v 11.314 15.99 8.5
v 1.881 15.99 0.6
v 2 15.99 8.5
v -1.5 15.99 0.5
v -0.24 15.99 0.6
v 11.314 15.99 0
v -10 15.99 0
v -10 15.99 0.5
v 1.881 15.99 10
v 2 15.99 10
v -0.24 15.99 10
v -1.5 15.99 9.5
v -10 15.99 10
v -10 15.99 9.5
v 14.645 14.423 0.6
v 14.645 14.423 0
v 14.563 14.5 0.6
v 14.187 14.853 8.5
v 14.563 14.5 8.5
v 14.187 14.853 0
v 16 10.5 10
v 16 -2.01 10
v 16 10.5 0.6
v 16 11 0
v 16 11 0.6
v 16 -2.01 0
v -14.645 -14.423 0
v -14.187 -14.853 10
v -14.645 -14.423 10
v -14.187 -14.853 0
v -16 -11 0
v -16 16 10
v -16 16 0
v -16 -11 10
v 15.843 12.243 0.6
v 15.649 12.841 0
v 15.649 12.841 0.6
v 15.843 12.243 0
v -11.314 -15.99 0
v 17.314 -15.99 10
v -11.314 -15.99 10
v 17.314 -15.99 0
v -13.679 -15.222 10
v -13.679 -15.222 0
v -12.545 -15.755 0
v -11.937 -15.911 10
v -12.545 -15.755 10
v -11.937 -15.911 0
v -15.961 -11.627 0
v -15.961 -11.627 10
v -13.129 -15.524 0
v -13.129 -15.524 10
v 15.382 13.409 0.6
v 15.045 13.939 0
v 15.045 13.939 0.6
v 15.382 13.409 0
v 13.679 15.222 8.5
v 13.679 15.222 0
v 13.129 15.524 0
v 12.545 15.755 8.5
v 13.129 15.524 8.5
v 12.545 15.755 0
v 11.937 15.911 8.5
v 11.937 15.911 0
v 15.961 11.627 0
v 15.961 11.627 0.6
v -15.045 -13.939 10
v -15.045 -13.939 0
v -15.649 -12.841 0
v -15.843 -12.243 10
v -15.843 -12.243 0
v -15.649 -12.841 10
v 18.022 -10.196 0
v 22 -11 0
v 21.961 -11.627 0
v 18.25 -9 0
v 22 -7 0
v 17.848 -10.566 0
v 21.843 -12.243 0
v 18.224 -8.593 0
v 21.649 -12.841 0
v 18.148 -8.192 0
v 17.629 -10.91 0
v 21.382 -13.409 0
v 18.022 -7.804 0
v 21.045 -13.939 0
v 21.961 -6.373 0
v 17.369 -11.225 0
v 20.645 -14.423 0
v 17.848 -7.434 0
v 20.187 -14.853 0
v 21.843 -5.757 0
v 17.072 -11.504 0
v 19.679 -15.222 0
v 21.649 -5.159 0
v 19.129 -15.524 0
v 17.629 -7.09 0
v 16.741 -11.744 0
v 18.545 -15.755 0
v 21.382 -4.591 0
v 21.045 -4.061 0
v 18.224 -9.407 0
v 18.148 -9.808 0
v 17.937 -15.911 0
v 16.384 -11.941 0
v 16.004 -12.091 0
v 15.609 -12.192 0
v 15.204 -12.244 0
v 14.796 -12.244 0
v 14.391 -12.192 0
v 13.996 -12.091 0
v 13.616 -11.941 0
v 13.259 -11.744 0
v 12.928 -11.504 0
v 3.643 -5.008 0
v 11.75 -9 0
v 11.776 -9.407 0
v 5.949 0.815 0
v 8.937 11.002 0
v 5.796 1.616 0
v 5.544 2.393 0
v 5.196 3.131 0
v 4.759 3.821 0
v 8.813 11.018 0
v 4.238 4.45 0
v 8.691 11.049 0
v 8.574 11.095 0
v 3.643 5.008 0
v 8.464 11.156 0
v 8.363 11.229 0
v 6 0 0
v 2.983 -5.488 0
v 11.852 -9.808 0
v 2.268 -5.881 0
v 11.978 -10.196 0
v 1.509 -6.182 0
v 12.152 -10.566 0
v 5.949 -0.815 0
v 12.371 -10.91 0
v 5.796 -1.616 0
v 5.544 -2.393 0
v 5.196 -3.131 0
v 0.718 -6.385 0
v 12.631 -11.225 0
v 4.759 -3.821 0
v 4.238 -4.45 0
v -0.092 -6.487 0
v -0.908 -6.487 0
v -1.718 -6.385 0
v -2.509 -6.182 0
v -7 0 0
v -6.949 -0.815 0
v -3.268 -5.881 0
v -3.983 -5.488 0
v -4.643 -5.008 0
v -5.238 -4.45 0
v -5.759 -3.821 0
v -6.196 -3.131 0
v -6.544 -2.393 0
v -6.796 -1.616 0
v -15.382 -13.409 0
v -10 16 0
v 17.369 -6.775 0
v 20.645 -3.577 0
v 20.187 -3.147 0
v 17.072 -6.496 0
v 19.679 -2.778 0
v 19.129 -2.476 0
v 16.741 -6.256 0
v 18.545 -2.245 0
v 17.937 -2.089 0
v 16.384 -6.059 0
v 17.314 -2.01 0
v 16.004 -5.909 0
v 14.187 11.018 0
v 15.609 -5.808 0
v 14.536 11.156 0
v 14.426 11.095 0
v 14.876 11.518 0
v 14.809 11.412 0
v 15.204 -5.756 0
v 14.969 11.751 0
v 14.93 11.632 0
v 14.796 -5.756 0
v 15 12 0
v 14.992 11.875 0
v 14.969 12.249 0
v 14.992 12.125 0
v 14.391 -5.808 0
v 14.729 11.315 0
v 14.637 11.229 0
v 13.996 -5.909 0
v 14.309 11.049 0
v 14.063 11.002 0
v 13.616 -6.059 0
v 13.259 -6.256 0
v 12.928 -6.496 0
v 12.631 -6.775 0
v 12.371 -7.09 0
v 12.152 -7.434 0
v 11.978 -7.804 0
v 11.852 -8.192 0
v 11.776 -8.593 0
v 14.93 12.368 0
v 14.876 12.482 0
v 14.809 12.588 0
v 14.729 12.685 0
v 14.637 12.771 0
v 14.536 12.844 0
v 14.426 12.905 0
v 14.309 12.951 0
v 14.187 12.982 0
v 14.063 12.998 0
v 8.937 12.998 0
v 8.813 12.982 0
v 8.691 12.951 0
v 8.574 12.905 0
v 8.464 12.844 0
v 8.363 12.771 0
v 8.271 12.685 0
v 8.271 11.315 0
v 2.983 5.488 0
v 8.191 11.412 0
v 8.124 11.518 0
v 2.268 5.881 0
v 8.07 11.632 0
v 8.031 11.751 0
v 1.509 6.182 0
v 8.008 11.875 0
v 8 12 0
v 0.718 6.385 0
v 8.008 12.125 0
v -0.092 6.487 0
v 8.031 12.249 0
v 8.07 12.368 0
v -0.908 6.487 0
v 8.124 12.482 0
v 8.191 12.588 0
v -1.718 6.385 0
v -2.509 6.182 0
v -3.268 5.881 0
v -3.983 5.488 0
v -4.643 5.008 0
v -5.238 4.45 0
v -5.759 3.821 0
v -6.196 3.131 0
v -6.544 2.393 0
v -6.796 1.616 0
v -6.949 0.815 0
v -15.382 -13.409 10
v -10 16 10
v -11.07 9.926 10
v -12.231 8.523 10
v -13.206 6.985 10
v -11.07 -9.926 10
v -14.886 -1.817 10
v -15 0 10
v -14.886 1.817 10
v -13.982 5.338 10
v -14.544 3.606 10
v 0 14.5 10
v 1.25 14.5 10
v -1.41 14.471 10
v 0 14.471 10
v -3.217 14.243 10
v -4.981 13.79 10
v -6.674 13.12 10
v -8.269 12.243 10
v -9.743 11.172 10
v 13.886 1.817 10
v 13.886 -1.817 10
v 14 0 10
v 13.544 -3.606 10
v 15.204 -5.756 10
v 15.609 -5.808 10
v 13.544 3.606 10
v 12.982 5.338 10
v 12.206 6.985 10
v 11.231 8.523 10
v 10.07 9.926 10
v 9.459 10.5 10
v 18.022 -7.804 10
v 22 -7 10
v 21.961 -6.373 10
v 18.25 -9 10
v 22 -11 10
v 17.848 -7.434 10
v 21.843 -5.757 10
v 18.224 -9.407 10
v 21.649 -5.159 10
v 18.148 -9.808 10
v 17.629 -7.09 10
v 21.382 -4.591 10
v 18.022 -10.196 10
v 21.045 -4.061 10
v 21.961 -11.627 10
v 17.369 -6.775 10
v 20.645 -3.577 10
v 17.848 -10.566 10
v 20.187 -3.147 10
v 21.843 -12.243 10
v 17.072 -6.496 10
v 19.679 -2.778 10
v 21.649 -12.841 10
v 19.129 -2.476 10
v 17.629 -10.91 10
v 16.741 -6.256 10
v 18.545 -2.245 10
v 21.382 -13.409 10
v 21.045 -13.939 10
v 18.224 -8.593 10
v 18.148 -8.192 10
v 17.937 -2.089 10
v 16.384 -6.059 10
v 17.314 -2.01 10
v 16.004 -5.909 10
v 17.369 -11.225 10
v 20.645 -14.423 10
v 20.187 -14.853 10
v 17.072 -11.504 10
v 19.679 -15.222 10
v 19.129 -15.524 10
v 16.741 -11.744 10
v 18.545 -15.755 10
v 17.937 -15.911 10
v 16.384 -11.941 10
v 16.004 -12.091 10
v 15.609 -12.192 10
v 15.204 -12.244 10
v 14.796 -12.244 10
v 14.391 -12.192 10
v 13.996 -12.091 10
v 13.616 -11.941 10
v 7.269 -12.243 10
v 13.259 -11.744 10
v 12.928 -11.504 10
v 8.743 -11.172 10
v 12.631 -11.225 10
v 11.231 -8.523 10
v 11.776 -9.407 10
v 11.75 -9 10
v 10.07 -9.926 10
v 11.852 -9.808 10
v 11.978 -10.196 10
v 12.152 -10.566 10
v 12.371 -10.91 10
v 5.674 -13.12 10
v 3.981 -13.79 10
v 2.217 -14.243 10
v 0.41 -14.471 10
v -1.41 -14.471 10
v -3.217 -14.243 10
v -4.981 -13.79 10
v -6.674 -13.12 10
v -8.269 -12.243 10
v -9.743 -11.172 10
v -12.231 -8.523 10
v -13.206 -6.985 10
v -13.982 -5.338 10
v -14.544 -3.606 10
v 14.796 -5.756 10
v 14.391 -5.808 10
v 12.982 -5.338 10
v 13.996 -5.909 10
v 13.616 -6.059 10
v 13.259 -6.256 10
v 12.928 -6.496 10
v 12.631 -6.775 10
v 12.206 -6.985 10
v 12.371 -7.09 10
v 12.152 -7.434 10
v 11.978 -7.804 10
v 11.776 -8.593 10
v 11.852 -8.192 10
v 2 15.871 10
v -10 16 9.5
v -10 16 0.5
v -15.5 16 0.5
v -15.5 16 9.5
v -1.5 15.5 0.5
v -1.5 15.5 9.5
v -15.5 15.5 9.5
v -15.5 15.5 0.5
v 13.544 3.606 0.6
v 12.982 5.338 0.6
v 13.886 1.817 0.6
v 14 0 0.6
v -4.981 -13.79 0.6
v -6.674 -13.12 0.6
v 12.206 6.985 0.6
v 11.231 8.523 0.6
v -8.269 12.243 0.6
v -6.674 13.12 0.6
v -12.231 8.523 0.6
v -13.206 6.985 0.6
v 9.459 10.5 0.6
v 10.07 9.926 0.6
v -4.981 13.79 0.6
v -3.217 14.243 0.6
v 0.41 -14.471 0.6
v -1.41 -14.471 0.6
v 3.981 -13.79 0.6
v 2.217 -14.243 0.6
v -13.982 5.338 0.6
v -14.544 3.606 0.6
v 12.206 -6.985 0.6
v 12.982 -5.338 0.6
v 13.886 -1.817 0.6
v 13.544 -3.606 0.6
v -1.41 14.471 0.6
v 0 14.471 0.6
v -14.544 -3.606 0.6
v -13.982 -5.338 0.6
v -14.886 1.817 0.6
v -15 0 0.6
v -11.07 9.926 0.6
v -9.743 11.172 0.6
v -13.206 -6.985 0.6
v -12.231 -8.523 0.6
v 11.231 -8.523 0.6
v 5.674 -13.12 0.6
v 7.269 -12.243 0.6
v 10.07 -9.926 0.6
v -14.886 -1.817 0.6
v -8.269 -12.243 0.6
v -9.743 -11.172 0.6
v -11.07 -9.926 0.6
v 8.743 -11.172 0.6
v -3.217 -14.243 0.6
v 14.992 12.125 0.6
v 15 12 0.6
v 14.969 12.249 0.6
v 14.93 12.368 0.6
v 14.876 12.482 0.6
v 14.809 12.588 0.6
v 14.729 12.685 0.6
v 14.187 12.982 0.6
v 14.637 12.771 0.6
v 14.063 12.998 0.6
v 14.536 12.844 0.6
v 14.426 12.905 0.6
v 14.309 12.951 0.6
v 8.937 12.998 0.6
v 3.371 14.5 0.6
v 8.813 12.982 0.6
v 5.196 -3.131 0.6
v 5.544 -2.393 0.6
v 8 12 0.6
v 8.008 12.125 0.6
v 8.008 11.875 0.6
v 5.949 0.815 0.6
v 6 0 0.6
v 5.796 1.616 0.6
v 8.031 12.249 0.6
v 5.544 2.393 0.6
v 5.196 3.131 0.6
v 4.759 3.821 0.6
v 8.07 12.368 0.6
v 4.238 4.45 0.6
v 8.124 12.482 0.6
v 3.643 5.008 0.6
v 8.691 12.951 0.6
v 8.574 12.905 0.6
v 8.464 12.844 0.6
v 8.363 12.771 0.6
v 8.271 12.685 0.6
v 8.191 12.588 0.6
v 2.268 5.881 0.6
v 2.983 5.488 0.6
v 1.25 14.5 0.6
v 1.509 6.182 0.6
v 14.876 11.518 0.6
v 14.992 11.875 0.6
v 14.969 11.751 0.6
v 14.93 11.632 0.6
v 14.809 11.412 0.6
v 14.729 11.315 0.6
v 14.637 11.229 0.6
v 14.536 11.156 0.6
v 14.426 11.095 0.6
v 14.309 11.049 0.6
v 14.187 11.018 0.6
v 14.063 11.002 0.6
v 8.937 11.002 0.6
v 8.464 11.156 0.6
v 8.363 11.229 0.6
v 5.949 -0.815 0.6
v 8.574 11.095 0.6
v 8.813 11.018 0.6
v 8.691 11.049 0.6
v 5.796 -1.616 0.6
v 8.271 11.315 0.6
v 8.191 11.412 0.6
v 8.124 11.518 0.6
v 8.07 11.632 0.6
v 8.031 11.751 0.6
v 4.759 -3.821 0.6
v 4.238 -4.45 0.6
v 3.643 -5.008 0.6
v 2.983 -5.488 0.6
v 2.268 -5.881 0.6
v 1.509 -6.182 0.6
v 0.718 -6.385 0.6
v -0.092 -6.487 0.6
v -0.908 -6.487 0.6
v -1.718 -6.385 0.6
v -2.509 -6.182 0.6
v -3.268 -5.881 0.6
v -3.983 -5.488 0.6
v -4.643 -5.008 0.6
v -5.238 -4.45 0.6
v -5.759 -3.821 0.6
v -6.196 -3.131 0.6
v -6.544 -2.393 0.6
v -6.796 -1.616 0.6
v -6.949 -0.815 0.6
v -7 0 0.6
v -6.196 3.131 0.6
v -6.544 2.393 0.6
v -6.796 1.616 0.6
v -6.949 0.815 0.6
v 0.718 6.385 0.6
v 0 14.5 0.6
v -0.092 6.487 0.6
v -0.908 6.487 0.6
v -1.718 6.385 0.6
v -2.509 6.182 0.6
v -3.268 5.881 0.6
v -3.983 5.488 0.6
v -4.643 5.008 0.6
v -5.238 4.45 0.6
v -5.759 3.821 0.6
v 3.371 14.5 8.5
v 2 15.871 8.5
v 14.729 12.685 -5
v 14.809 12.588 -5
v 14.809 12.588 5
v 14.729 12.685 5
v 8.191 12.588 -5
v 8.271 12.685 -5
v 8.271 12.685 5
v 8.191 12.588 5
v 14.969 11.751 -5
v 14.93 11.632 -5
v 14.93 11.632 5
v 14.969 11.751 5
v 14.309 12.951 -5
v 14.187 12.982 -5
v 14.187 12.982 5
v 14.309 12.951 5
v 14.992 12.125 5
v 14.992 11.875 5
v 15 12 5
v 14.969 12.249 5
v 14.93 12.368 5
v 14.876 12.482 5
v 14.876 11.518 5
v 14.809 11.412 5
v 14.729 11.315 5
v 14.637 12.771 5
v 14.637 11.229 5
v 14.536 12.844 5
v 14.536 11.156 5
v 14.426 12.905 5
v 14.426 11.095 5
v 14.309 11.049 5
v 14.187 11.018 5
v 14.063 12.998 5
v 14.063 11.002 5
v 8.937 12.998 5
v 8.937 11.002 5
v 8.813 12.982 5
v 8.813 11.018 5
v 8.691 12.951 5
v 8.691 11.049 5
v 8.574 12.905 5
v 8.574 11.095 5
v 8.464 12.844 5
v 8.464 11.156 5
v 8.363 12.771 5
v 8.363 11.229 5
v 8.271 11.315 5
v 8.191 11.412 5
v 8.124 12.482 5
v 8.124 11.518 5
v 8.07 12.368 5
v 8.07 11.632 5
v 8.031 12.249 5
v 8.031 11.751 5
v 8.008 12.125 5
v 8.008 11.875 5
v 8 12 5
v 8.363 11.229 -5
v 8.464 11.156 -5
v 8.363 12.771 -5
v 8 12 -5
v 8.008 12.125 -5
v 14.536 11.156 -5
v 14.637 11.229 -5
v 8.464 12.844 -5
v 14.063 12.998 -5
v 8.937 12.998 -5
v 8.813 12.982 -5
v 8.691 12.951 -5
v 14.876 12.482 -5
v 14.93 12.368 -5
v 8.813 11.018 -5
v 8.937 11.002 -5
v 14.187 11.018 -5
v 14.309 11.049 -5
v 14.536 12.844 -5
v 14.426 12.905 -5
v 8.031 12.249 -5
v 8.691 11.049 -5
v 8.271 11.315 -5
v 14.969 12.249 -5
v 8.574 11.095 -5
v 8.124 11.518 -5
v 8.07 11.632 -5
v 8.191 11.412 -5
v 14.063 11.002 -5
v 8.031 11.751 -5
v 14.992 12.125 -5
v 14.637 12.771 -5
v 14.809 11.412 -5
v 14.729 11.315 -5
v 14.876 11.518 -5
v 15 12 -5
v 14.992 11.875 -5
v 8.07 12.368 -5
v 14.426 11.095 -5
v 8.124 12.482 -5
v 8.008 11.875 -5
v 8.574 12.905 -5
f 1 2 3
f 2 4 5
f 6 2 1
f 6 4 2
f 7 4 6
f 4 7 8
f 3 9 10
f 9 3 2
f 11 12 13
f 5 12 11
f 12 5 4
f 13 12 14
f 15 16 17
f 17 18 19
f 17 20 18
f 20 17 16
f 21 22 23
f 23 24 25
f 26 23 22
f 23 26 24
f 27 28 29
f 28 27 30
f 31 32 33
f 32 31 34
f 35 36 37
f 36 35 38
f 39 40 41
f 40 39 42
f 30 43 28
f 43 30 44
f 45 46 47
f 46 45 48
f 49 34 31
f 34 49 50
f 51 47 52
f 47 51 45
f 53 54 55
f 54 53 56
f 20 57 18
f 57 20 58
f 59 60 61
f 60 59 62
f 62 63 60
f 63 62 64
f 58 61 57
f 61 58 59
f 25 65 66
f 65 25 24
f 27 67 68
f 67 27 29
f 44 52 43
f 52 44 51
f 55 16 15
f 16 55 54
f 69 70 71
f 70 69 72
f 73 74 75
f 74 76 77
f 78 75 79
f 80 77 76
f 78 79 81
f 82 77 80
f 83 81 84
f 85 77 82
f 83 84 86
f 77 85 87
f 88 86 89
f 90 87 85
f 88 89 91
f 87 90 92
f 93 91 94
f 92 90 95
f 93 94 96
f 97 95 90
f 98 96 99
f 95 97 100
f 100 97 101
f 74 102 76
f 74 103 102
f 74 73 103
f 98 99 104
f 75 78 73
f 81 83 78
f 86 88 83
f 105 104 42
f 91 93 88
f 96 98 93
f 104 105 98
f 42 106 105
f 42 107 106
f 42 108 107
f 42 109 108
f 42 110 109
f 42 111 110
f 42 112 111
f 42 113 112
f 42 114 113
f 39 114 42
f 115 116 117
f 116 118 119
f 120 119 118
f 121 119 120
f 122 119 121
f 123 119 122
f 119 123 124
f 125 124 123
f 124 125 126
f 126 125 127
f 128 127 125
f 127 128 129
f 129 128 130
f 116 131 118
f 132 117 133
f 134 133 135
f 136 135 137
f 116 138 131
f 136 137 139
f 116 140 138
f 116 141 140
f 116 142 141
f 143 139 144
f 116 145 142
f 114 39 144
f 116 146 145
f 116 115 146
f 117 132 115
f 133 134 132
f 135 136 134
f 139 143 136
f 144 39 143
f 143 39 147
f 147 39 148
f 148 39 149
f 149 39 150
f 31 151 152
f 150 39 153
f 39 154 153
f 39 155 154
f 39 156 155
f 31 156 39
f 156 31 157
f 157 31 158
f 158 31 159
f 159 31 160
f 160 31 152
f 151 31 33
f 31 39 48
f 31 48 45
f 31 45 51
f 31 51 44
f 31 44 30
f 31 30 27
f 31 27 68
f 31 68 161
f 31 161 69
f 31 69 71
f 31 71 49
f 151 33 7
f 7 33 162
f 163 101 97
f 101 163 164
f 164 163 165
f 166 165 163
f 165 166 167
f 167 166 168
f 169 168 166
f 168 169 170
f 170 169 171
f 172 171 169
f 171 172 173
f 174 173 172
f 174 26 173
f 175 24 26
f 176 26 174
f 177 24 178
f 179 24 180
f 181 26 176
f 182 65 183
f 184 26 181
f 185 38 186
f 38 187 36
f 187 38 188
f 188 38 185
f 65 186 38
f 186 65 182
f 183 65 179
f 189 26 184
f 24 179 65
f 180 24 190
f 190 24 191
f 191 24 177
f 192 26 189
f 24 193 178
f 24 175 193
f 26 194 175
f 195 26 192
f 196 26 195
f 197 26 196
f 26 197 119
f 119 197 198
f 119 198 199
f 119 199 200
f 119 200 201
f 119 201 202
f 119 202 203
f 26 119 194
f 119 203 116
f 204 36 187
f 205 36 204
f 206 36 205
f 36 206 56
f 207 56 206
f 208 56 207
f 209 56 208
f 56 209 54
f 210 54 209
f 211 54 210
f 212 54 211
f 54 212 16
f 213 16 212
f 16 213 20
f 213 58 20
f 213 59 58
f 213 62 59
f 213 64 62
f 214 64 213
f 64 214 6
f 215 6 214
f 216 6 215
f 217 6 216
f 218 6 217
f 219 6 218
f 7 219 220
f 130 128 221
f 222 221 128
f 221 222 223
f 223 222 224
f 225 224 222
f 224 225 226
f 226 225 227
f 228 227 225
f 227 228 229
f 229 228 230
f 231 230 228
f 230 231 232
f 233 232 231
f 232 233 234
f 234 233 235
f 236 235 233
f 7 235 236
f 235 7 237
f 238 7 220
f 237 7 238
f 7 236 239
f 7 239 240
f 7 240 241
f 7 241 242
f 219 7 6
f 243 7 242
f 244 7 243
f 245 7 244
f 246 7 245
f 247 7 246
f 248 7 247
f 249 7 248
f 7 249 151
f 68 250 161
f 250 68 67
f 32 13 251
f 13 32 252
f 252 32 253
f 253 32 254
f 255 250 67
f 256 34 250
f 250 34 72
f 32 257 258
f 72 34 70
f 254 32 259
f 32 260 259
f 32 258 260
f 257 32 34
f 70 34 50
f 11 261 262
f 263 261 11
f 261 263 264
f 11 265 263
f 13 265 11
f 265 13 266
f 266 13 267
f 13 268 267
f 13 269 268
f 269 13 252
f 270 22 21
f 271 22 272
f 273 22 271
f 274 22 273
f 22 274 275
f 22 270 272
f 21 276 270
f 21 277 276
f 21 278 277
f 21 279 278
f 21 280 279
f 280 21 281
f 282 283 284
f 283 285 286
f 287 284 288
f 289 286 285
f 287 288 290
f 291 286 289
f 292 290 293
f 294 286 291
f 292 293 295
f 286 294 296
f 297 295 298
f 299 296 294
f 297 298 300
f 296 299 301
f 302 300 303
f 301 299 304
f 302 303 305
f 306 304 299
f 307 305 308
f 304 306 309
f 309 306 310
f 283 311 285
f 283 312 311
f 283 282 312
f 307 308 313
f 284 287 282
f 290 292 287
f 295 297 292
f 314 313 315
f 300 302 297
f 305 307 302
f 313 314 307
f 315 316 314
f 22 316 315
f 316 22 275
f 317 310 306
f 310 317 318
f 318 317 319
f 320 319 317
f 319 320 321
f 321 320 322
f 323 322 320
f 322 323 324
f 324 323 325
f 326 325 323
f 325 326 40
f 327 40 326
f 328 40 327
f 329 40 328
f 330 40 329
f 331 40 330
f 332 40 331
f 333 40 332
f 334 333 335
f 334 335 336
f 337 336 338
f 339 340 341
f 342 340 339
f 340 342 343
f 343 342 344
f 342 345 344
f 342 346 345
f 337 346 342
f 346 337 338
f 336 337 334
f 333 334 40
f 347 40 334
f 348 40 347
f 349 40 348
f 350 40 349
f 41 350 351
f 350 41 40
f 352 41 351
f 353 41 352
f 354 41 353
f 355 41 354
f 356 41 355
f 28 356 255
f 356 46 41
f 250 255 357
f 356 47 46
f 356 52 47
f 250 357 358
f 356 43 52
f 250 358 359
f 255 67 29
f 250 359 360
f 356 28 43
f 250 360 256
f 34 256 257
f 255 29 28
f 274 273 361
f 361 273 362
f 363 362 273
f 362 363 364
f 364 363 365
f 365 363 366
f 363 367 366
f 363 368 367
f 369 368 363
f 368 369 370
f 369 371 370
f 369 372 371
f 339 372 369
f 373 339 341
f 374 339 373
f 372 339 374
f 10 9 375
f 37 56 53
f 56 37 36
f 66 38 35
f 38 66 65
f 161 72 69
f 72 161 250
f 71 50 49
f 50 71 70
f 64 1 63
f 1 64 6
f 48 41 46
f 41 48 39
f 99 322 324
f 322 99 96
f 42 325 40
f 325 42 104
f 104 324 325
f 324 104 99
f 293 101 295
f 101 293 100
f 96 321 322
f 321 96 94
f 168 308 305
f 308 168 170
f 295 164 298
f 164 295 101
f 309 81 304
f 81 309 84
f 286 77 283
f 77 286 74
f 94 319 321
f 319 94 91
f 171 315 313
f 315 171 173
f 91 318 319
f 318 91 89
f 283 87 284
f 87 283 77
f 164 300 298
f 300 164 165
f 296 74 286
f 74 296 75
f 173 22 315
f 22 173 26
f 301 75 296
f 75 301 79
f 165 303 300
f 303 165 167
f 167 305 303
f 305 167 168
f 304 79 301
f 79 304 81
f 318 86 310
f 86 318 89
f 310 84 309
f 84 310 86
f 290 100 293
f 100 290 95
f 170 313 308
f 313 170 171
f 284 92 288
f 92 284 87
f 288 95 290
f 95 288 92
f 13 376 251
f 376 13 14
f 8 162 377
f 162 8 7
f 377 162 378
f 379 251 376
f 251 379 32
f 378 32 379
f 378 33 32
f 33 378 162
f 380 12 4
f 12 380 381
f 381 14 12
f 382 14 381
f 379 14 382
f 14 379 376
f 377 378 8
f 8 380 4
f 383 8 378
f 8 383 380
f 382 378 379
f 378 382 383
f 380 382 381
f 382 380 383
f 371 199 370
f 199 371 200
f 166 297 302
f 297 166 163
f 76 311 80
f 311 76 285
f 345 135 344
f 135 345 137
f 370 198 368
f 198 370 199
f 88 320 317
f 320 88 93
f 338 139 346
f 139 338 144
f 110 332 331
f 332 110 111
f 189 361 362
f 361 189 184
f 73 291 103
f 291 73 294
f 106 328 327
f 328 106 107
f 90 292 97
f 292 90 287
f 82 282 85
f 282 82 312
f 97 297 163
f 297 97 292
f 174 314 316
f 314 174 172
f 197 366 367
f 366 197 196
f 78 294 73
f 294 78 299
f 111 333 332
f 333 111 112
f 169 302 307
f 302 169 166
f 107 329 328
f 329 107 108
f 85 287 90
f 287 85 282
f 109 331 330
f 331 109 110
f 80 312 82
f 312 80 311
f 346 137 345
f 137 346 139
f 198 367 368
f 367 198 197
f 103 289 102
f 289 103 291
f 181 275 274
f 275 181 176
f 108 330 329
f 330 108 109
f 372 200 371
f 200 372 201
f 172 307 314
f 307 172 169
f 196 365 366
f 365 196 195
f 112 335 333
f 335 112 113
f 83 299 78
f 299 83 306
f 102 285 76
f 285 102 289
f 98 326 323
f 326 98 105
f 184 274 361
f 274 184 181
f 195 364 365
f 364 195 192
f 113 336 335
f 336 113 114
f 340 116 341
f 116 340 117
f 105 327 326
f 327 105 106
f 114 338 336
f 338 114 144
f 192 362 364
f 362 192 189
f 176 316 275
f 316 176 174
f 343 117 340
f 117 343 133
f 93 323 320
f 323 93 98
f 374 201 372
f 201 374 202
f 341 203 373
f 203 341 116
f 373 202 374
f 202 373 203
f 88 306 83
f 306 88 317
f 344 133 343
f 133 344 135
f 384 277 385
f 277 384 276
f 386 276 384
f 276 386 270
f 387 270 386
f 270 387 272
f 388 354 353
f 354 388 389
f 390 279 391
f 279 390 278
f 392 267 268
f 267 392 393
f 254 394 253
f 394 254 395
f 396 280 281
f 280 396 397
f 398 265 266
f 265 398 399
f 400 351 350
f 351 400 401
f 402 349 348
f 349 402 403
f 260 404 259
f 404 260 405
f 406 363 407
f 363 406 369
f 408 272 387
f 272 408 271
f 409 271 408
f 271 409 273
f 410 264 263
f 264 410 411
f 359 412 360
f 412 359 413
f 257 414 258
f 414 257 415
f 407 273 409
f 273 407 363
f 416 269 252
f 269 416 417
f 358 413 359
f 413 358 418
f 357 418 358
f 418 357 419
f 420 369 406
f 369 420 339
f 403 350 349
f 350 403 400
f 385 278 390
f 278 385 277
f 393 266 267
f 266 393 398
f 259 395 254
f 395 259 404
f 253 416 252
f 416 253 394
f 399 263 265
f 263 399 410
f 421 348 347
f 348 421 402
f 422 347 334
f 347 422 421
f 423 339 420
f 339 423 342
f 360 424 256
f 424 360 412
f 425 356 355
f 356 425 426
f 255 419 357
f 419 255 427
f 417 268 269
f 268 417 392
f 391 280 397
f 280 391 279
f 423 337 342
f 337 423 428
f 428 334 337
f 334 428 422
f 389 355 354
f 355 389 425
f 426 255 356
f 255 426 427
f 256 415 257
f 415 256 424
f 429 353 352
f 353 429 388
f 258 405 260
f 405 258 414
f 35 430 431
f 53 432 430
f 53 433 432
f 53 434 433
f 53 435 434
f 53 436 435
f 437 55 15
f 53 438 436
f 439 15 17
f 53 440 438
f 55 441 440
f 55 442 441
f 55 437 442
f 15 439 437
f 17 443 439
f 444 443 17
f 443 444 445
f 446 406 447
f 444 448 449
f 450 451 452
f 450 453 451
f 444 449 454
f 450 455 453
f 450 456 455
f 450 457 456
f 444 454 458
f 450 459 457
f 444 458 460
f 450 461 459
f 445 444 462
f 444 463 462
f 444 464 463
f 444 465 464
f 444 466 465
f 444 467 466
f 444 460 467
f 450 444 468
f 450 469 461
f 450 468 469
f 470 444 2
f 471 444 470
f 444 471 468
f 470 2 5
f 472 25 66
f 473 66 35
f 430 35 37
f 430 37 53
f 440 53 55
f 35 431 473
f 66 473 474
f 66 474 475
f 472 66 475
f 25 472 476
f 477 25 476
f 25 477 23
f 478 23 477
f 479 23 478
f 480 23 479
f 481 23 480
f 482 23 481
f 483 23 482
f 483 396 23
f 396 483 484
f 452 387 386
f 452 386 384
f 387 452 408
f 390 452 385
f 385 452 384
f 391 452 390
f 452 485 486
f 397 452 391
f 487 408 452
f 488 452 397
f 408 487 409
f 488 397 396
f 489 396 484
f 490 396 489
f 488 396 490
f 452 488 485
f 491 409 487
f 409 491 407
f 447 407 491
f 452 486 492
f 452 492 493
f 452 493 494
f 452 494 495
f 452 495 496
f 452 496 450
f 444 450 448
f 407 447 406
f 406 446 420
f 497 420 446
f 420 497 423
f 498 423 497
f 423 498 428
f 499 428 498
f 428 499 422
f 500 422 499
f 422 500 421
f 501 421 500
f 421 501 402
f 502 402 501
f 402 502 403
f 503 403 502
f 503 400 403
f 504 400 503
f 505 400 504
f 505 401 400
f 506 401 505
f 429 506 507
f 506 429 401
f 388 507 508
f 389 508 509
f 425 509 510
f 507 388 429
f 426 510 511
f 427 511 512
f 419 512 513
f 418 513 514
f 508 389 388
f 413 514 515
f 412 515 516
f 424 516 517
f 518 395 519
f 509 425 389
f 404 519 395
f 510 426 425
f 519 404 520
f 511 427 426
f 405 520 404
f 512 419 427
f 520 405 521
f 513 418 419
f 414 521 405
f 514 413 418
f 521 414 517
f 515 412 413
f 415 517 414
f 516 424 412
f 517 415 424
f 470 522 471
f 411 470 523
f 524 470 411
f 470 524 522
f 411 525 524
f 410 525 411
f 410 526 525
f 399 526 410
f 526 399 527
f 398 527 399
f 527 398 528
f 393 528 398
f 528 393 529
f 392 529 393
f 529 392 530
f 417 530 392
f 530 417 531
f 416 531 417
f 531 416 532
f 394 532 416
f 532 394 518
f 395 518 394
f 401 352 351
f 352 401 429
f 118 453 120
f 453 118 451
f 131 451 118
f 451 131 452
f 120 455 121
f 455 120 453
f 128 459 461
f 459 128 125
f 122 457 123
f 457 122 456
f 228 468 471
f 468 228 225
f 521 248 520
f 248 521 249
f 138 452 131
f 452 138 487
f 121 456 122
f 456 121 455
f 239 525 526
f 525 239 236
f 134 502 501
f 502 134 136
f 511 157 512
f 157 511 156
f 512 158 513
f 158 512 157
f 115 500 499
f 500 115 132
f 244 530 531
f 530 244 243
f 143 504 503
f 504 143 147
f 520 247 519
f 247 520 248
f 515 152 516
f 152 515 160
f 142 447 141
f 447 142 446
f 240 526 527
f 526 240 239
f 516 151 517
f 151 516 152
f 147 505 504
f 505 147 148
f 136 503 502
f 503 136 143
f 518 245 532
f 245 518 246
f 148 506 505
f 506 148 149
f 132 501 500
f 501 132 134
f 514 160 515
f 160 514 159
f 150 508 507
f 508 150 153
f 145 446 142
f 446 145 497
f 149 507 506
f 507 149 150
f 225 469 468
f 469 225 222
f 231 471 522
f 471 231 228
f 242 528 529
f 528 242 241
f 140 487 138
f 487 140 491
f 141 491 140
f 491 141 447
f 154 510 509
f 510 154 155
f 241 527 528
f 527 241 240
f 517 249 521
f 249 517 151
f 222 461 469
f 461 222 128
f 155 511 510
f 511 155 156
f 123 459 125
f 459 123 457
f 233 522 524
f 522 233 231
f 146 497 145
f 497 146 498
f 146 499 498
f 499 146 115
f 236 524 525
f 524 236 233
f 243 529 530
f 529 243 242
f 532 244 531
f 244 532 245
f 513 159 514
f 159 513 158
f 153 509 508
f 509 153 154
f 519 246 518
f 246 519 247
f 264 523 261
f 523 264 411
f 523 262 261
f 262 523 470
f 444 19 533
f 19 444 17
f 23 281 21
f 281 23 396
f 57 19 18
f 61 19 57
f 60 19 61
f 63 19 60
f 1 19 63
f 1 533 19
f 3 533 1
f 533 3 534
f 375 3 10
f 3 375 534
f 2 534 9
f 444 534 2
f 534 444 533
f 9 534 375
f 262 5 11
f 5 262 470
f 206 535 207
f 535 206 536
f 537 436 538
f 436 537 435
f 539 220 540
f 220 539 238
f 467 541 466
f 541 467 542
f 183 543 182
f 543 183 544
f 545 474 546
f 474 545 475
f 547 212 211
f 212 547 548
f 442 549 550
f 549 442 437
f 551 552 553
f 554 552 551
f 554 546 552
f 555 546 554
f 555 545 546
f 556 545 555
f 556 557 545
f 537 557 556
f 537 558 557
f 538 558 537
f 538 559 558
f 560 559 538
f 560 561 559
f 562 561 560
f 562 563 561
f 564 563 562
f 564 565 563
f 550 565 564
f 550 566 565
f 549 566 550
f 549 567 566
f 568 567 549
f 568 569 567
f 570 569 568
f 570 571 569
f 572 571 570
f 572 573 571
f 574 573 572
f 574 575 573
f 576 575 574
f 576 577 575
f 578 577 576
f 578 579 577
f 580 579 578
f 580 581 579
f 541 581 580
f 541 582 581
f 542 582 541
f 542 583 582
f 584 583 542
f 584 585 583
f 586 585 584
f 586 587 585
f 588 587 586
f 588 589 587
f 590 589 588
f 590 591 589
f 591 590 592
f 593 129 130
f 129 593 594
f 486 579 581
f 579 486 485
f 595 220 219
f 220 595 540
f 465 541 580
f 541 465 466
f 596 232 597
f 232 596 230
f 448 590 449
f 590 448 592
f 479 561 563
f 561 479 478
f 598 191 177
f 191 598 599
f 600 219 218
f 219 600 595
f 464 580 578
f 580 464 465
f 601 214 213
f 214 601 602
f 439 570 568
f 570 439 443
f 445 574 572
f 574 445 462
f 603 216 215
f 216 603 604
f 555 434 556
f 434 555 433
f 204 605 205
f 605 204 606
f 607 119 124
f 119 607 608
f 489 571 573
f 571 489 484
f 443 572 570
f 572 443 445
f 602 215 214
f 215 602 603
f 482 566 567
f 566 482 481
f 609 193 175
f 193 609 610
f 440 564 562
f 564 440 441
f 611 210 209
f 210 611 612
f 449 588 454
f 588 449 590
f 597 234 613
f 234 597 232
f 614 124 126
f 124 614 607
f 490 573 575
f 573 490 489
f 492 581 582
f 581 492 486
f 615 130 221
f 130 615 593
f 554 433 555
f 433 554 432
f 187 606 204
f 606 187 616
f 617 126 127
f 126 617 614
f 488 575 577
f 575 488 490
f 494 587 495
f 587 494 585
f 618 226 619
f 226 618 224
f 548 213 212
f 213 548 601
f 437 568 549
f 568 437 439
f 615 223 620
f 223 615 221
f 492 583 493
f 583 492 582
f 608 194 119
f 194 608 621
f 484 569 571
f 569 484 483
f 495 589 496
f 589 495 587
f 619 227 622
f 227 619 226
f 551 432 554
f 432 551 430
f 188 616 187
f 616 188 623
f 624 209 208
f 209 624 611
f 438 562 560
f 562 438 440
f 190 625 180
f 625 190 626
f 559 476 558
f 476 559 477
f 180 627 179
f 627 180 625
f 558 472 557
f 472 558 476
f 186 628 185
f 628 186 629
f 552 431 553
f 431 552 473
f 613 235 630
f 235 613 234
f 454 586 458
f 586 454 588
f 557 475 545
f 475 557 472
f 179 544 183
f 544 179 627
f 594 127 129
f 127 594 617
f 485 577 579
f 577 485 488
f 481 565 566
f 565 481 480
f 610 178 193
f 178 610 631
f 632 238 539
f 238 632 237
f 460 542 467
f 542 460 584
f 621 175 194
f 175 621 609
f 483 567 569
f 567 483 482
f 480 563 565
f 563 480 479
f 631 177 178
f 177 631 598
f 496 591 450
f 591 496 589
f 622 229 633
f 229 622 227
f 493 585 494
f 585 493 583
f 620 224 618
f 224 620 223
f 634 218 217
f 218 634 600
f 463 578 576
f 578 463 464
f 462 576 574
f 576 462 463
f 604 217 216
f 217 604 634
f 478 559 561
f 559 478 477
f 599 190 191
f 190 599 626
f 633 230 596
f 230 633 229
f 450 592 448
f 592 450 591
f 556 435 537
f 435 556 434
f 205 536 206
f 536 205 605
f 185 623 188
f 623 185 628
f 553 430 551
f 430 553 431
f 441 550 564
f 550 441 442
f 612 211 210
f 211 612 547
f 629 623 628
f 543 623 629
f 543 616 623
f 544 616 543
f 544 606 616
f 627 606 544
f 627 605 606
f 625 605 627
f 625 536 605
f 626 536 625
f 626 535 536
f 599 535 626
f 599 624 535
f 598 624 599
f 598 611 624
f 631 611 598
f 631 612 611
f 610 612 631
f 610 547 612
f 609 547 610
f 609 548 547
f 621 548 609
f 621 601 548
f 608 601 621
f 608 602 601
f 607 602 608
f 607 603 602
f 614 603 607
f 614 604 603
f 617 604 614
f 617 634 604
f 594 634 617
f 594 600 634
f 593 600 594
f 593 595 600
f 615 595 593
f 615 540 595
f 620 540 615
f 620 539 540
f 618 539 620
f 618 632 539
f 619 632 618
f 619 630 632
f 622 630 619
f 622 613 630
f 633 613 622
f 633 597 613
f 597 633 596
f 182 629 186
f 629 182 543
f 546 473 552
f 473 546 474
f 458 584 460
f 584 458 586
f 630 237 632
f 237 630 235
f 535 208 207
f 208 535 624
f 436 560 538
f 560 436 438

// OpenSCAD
$fn = 50;


union() {
	difference() {
		union() {
			hull() {
				translate(v = [-11.0000000000, 11.0000000000, 0]) {
					cylinder(h = 10, r = 5);
				}
				translate(v = [11.0000000000, 11.0000000000, 0]) {
					cylinder(h = 10, r = 5);
				}
				translate(v = [-11.0000000000, -11.0000000000, 0]) {
					cylinder(h = 10, r = 5);
				}
				translate(v = [11.0000000000, -11.0000000000, 0]) {
					cylinder(h = 10, r = 5);
				}
			}
			translate(v = [7.5000000000, -9.0000000000, 0]) {
				hull() {
					translate(v = [-9.5000000000, 2.0000000000, 0]) {
						cylinder(h = 10, r = 5);
					}
					translate(v = [9.5000000000, 2.0000000000, 0]) {
						cylinder(h = 10, r = 5);
					}
					translate(v = [-9.5000000000, -2.0000000000, 0]) {
						cylinder(h = 10, r = 5);
					}
					translate(v = [9.5000000000, -2.0000000000, 0]) {
						cylinder(h = 10, r = 5);
					}
				}
			}
			translate(v = [-16.0000000000, 10.0000000000, 0]) {
				cube(size = [6, 6, 10]);
			}
		}
		union() {
			translate(v = [-15.5000000000, 15.5000000000, 0.5000000000]) {
				cube(size = [14, 0.5000000000, 9.0000000000]);
			}
			translate(v = [15.0000000000, -9.0000000000, -100.0000000000]) {
				cylinder(h = 200, r = 3.2500000000);
			}
			translate(v = [-0.5000000000, 0.0000000000, 0.6000000000]) {
				cylinder(h = 12.4000000000, r = 14.5000000000);
			}
			translate(v = [-0.5000000000, 0.0000000000, -5.0000000000]) {
				cylinder(h = 10, r = 6.5000000000);
			}
			translate(v = [0.0000000000, 10.5000000000, 0.6000000000]) {
				cube(size = [16.0000000000, 4, 12.4000000000]);
			}
			translate(v = [2.0000000000, 10.5000000000, 8.5000000000]) {
				cube(size = [14.0000000000, 7, 1.5000000000]);
			}
			translate(v = [-3.0000000000, 18.7500000000, 0.6000000000]) {
				rotate(a = [0, 0, -45]) {
					cube(size = [10, 1.5000000000, 12.4000000000]);
				}
			}
			translate(v = [2.2500000000, 11.0000000000, 0.6000000000]) {
				cube(size = [7.5000000000, 2, 9.4000000000]);
			}
		}
	}
	union() {
		translate(v = [11.5000000000, 12, -5.0000000000]) {
			rotate(a = [0, 0, 0]) {
				difference() {
					union() {
						hull() {
							translate(v = [2.5000000000, 0, 0]) {
								cylinder(h = 10, r = 1.0000000000, r1 = 1.0000000000, r2 = 1.0000000000);
							}
							translate(v = [-2.5000000000, 0, 0]) {
								cylinder(h = 10, r = 1.0000000000, r1 = 1.0000000000, r2 = 1.0000000000);
							}
						}
					}
					union();
				}
			}
		}
	}
}
